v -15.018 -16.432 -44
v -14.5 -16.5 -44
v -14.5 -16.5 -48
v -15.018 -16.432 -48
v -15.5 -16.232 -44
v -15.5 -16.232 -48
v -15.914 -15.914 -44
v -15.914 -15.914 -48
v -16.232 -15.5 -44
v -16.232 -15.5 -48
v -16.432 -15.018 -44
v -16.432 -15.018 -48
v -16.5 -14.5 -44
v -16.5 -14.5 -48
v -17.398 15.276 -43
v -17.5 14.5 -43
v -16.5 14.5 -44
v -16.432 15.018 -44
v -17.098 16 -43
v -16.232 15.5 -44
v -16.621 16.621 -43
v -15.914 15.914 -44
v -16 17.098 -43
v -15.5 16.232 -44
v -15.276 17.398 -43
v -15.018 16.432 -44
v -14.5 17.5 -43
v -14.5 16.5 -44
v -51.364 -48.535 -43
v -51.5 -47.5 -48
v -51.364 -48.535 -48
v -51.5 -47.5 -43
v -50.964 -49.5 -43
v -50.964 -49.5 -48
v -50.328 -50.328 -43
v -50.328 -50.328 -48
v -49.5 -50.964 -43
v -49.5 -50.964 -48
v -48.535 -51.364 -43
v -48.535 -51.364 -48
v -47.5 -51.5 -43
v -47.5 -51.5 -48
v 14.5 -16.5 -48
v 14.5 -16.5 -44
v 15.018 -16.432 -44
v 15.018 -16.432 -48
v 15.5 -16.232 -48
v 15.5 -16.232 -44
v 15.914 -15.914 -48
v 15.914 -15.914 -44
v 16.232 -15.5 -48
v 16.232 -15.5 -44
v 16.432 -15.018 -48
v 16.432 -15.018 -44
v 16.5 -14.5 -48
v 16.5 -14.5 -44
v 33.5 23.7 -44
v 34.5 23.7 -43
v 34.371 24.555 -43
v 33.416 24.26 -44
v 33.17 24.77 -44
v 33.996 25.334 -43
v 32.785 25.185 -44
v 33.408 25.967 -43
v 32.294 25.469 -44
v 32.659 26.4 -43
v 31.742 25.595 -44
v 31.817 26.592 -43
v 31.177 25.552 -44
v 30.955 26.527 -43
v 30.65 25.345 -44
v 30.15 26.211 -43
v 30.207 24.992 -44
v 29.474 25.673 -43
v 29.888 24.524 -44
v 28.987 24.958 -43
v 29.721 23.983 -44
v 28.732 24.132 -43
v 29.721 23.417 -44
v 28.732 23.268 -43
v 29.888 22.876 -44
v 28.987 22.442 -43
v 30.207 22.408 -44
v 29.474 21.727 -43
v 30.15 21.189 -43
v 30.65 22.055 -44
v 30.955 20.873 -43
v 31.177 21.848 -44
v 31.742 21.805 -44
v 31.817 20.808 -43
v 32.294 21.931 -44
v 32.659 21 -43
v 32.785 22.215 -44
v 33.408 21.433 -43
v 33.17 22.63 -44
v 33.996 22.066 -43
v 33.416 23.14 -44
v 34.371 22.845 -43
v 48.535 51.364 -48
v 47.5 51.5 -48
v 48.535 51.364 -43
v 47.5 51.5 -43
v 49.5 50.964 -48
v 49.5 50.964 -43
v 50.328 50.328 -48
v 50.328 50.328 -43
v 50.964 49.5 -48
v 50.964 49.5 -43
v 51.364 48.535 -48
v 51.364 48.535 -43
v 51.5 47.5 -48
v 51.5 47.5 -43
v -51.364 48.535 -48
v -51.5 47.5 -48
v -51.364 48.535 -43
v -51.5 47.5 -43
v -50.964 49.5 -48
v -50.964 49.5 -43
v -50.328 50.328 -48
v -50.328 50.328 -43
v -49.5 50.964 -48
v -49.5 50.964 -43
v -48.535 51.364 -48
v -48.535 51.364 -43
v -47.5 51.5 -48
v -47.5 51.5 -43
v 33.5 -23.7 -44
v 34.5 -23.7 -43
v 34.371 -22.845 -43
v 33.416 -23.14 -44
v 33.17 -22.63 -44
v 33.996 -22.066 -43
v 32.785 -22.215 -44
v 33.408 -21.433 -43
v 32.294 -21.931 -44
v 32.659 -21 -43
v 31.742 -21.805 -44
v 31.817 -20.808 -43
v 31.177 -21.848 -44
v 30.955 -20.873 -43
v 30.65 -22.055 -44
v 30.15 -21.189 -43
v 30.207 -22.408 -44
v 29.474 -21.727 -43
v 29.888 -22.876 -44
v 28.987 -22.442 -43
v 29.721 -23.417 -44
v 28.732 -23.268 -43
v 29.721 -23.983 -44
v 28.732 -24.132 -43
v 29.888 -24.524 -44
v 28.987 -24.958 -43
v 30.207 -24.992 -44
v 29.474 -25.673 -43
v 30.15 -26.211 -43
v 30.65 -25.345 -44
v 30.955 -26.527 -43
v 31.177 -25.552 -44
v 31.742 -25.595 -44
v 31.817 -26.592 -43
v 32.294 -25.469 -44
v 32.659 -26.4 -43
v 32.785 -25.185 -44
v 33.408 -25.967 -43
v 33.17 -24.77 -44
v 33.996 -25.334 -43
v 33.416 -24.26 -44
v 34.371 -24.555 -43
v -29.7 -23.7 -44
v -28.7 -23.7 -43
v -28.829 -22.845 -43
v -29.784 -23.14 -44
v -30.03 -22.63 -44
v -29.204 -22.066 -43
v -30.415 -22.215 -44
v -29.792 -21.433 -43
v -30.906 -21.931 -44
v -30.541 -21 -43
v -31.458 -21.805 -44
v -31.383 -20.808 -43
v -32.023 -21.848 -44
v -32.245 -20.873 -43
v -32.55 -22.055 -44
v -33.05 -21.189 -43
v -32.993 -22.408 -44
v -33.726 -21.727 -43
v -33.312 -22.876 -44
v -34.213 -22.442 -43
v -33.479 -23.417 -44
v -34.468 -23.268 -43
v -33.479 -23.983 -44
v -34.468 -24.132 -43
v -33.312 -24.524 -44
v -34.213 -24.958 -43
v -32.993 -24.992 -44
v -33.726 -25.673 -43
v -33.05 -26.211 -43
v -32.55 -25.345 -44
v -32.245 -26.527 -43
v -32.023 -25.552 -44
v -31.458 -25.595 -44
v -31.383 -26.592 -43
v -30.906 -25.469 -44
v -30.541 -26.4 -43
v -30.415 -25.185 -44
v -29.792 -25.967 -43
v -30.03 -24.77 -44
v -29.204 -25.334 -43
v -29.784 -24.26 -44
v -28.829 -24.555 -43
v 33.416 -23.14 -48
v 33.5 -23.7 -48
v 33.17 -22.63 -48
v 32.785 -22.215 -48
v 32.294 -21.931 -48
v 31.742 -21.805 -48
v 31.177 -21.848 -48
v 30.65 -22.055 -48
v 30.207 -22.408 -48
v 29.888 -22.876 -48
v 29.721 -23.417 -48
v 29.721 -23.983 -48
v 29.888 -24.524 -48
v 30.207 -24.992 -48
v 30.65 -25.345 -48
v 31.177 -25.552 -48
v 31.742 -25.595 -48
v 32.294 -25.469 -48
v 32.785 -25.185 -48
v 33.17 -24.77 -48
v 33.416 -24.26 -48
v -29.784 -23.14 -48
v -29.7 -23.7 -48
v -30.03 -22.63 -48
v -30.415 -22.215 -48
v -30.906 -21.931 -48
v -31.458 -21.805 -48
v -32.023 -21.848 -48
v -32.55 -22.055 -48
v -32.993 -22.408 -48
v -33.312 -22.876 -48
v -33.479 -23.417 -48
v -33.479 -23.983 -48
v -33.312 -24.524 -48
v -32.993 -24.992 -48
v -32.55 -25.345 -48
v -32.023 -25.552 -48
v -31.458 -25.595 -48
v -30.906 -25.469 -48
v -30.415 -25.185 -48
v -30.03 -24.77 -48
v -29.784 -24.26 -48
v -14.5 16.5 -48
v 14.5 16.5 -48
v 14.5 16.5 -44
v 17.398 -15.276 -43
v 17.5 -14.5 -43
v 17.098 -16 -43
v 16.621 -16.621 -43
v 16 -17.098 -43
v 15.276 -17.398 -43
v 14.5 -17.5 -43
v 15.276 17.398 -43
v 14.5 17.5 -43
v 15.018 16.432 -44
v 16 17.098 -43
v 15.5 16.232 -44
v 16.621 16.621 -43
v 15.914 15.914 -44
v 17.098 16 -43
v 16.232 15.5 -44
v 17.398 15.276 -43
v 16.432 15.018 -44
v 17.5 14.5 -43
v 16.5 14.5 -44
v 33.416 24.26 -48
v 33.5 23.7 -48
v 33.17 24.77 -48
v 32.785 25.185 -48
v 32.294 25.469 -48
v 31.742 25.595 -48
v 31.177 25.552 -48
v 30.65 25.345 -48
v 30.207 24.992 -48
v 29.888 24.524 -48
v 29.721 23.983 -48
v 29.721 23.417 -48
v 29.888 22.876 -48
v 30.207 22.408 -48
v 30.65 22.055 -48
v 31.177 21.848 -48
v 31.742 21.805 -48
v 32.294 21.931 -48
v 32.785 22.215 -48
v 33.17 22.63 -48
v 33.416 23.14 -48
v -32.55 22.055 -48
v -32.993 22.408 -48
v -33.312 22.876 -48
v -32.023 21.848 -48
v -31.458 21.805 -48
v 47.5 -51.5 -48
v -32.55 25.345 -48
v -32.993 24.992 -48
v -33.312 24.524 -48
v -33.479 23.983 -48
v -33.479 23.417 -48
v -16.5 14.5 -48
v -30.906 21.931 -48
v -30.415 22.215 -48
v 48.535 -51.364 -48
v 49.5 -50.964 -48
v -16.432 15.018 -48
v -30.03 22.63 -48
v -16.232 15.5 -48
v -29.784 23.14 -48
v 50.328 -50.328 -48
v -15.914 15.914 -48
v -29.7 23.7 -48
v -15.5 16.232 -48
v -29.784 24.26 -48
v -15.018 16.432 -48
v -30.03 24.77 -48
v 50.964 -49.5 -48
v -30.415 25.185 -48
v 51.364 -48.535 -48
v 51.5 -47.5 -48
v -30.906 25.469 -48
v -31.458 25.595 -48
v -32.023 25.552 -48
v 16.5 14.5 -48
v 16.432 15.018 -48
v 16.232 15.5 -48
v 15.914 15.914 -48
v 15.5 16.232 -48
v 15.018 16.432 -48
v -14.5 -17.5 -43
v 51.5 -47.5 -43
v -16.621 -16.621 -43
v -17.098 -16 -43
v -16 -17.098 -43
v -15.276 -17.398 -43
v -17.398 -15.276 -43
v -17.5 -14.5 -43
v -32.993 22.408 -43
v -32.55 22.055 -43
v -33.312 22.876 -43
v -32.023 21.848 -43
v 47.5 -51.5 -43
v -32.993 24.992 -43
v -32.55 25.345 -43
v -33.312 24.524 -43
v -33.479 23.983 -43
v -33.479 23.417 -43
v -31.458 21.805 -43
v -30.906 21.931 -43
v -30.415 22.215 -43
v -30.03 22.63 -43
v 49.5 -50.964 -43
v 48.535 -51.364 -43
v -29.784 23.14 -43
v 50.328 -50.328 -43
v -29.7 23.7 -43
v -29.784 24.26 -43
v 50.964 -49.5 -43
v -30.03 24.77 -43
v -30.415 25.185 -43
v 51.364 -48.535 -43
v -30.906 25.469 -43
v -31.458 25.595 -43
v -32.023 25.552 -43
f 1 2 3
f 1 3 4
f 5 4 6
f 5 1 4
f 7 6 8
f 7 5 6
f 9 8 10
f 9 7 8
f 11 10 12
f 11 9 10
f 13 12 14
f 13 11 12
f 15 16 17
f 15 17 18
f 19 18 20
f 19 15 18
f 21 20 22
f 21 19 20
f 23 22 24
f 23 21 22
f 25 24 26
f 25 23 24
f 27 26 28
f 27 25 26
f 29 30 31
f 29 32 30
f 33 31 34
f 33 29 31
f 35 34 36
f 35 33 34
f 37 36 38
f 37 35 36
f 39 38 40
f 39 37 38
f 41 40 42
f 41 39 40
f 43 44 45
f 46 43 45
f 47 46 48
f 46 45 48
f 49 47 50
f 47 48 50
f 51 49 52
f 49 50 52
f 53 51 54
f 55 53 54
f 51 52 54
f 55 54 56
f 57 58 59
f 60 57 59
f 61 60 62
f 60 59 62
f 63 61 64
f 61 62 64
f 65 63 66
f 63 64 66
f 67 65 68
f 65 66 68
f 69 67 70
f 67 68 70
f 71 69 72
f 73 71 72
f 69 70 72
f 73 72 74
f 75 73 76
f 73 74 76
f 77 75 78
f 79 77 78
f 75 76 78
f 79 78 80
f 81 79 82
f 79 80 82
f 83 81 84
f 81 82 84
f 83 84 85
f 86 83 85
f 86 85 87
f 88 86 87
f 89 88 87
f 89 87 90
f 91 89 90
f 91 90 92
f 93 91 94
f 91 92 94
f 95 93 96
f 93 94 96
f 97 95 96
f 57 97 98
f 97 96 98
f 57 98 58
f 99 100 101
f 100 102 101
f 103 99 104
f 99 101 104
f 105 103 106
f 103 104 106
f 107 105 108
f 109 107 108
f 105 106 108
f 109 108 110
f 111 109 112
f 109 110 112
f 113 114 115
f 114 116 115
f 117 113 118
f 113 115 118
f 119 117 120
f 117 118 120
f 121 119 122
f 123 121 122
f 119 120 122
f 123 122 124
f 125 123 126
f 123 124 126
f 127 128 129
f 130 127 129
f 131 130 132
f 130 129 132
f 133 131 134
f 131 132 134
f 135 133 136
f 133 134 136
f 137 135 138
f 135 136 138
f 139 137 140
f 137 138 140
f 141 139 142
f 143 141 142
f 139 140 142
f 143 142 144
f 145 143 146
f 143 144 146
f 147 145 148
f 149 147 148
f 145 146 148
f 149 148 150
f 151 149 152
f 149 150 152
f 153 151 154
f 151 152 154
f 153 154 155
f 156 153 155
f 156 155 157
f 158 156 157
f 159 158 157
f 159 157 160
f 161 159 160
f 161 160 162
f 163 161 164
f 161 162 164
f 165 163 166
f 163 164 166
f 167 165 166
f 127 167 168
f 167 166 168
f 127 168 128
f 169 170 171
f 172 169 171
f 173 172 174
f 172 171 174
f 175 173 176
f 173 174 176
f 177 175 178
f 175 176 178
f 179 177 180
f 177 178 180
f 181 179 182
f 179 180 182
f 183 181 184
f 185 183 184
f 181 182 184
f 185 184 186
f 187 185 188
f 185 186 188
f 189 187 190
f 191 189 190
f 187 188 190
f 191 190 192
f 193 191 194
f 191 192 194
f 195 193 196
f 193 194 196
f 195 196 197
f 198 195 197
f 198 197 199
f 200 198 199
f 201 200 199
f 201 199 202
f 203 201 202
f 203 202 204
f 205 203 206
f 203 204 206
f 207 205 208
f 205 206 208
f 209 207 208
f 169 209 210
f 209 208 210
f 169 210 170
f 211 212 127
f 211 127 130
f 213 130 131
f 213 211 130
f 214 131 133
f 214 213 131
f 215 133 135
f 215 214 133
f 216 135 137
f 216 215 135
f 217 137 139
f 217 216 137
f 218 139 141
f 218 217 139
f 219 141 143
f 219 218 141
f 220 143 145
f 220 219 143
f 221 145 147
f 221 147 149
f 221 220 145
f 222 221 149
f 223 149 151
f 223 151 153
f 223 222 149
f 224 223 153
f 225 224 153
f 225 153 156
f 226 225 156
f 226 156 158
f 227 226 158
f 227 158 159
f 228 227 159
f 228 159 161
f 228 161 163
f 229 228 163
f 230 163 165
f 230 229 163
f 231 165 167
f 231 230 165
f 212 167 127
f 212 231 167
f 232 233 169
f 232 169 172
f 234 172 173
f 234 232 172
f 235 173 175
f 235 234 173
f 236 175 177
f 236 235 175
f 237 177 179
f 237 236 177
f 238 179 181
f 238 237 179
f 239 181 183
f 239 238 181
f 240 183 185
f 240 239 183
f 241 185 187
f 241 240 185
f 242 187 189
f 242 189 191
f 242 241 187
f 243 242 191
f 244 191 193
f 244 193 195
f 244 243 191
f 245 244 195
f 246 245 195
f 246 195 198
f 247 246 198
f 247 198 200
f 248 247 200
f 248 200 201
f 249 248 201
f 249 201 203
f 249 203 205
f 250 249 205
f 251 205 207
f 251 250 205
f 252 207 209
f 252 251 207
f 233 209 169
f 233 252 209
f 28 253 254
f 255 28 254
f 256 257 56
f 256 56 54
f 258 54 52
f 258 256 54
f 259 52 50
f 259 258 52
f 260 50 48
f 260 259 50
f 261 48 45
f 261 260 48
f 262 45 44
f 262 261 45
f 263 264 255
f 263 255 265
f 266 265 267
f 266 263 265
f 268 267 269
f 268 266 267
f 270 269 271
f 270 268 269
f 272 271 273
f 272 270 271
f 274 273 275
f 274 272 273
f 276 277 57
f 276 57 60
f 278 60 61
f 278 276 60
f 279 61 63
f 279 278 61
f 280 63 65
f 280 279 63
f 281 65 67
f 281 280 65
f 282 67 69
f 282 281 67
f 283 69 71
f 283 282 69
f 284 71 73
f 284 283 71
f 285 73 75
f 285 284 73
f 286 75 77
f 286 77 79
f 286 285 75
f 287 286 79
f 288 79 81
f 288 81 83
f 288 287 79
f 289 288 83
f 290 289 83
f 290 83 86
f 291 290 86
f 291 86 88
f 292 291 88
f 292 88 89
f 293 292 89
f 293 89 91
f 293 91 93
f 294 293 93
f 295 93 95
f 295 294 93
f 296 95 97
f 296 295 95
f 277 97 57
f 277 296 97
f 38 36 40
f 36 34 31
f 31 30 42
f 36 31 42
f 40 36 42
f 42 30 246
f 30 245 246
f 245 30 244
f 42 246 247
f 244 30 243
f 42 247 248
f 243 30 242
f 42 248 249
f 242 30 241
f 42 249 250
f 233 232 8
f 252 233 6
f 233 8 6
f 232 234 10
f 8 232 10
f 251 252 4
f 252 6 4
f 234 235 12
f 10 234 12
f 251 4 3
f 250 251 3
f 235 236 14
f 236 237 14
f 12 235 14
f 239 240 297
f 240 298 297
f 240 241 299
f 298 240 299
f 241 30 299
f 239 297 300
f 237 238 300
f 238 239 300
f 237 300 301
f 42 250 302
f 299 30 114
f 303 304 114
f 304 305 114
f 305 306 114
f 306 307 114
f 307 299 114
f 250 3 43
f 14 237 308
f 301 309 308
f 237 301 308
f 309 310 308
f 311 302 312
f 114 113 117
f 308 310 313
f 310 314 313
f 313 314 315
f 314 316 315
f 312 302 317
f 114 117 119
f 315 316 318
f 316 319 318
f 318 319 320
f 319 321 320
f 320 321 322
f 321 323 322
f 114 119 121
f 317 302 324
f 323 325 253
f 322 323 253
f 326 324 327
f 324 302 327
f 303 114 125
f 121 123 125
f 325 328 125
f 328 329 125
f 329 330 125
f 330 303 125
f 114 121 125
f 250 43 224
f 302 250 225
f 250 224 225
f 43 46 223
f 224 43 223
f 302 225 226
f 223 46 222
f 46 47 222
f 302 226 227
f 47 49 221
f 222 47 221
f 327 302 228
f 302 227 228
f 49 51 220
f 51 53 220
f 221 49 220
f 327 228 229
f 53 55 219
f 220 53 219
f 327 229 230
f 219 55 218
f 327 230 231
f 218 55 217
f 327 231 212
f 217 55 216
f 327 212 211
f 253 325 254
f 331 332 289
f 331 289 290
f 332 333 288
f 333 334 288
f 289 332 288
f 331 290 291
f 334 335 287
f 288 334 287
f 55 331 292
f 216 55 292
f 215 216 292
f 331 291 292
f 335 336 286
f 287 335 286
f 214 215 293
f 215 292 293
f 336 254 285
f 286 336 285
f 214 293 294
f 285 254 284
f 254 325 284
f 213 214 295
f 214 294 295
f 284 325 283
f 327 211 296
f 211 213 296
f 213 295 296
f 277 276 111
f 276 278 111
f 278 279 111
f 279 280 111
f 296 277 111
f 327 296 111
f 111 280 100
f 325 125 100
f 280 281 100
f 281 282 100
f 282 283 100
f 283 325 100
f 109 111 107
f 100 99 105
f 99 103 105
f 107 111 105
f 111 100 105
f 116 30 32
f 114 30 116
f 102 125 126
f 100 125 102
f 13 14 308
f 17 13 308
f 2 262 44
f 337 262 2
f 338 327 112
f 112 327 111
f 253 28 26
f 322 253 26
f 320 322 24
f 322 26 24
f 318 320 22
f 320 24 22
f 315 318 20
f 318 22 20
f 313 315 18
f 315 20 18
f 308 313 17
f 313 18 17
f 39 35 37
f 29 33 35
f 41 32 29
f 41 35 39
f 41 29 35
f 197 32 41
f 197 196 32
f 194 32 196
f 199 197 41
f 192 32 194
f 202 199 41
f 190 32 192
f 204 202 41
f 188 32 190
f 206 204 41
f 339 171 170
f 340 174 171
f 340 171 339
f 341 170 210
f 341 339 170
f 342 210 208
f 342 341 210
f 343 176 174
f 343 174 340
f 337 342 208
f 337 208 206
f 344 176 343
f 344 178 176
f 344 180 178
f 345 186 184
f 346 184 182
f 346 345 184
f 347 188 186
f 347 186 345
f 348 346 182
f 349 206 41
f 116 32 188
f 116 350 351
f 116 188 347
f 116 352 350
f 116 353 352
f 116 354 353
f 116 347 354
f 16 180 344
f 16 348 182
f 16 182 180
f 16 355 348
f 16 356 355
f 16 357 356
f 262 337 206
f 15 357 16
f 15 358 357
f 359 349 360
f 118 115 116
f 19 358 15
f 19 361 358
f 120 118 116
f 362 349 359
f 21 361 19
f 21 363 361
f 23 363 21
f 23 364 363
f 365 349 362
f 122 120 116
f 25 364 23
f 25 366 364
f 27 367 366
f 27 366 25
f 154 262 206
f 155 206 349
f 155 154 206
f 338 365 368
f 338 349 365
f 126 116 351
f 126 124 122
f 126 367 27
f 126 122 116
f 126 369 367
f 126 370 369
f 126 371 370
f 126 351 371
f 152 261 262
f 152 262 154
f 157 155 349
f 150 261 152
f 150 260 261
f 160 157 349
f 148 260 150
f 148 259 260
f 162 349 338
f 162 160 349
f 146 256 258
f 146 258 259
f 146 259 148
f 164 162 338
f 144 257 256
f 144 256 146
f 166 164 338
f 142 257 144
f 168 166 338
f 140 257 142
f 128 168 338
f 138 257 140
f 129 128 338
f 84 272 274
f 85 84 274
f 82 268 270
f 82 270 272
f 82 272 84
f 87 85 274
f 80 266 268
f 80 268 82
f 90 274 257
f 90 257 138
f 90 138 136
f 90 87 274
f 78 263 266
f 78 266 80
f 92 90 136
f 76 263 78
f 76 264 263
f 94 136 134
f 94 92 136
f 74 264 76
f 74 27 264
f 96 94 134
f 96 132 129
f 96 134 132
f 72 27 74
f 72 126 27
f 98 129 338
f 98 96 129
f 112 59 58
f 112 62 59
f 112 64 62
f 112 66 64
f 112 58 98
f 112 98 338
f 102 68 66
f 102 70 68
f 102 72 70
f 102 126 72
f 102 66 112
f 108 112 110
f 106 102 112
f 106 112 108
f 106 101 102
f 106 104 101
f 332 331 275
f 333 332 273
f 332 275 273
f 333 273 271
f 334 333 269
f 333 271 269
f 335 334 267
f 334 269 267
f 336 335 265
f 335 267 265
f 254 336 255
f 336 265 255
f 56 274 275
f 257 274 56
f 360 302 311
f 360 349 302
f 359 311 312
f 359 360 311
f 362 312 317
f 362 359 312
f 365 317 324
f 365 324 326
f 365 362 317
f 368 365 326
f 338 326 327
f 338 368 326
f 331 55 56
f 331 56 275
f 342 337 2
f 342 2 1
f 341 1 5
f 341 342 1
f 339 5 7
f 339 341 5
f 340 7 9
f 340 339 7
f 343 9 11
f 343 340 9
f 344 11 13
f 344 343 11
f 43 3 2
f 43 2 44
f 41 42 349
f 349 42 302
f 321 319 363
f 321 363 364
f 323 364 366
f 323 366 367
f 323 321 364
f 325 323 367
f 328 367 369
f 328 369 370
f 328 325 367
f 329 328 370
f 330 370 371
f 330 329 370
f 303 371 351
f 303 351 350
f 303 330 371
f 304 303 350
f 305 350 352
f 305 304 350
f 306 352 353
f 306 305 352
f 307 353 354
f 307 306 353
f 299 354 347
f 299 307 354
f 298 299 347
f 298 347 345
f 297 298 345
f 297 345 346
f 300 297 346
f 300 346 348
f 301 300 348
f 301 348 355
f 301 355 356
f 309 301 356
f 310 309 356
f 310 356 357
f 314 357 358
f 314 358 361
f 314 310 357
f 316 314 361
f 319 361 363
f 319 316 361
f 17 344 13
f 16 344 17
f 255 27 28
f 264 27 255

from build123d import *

# Parameters (mm, degrees)
CYLINDER006_R     = 1.9
CYLINDER006_DEPTH = 5
CYLINDER007_R     = 1.9
CYLINDER007_DEPTH = 5
CYLINDER008_R     = 1.9
CYLINDER008_DEPTH = 5
CYLINDER005_R     = 1.9
CYLINDER005_DEPTH = 5
BOX009_W          = 33
BOX009_H          = 33
BOX009_DEPTH      = 5
BOX010_W          = 72
BOX010_H          = 72
BOX010_DEPTH      = 5
FILLET002_R       = 2
FILLET003_R       = 4
CHAMFER001_SIZE   = 1
BOX013_W          = 69.4
BOX013_H          = 69.4
BOX013_DEPTH      = 5
BOX012_W          = 103
BOX012_H          = 103
BOX012_DEPTH      = 5
FILLET005_R       = 4
FILLET006_R       = 2


with BuildPart() as cilindro003:
    # Cylinder006 → Cylinder006 (new body)
    with BuildSketch(Plane(origin=(31.6, 23.7, -48), x_dir=(1, 0, 0), z_dir=(0, 0, 1))):
        Circle(CYLINDER006_R)
    extrude(amount=CYLINDER006_DEPTH)


with BuildPart() as cilindro004:
    # Cylinder007 → Cylinder007 (new body)
    with BuildSketch(Plane(origin=(-31.6, 23.7, -48), x_dir=(1, 0, 0), z_dir=(0, 0, 1))):
        Circle(CYLINDER007_R)
    extrude(amount=CYLINDER007_DEPTH)


with BuildPart() as cilindro005:
    # Cylinder008 → Cylinder008 (new body)
    with BuildSketch(Plane(origin=(-31.6, -23.7, -48), x_dir=(1, 0, 0), z_dir=(0, 0, 1))):
        Circle(CYLINDER008_R)
    extrude(amount=CYLINDER008_DEPTH)


with BuildPart() as compound003:
    # Cylinder005 → Cylinder005 (new body)
    with BuildSketch(Plane(origin=(31.6, -23.7, -48), x_dir=(1, 0, 0), z_dir=(0, 0, 1))):
        Circle(CYLINDER005_R)
    extrude(amount=CYLINDER005_DEPTH)

    # Compound003: union Cilindro003, Cilindro004, Cilindro005
    add(cilindro003.part)
    add(cilindro004.part)
    add(cilindro005.part)


with BuildPart() as cubo008:
    # Box009 → Box009 (new body)
    with BuildSketch(Plane(origin=(-16.5, -16.5, -48), x_dir=(1, 0, 0), z_dir=(0, 0, 1))):
        with Locations((16.5, 16.5)):
            Rectangle(BOX009_W, BOX009_H)
    extrude(amount=BOX009_DEPTH)


with BuildPart() as chamfer001:
    # Box010 → Box010 (new body)
    with BuildSketch(Plane(origin=(-36, -36, -48), x_dir=(1, 0, 0), z_dir=(0, 0, 1))):
        with Locations((36, 36)):
            Rectangle(BOX010_W, BOX010_H)
    extrude(amount=BOX010_DEPTH)

    # Cut003: cut Cubo008
    add(cubo008.part, mode=Mode.SUBTRACT)

    # Fillet002
    fillet002_edges = [chamfer001.edges().sort_by_distance(p)[0] for p in [
        (-16.5, -16.5, -45.5),
        (-16.5, 16.5, -45.5),
        (16.5, -16.5, -45.5),
        (16.5, 16.5, -45.5),
    ]]
    fillet(fillet002_edges, radius=FILLET002_R)

    # Fillet003
    fillet003_edges = [chamfer001.edges().sort_by_distance(p)[0] for p in [
        (-36, -36, -45.5),
        (-36, 36, -45.5),
        (36, 36, -45.5),
        (36, -36, -45.5),
    ]]
    fillet(fillet003_edges, radius=FILLET003_R)

    # Cut006: cut Compound003
    add(compound003.part, mode=Mode.SUBTRACT)

    # Chamfer001
    chamfer001_edges = [chamfer001.edges().sort_by_distance(p)[0] for p in [
        (-33.5, -23.7, -43),
        (29.7, -23.7, -43),
        (-16.5, 0, -43),
        (29.7, 23.7, -43),
    ]]
    chamfer(chamfer001_edges, length=CHAMFER001_SIZE)


with BuildPart() as cubo012:
    # Box013 → Box013 (new body)
    with BuildSketch(Plane(origin=(-34.7, -34.7, -48), x_dir=(1, 0, 0), z_dir=(0, 0, 1))):
        with Locations((34.7, 34.7)):
            Rectangle(BOX013_W, BOX013_H)
    extrude(amount=BOX013_DEPTH)


with BuildPart() as fusion002:
    # Box012 → Box012 (new body)
    with BuildSketch(Plane(origin=(-51.5, -51.5, -48), x_dir=(1, 0, 0), z_dir=(0, 0, 1))):
        with Locations((51.5, 51.5)):
            Rectangle(BOX012_W, BOX012_H)
    extrude(amount=BOX012_DEPTH)

    # Cut005: cut Cubo012
    add(cubo012.part, mode=Mode.SUBTRACT)

    # Fillet005
    fillet005_edges = [fusion002.edges().sort_by_distance(p)[0] for p in [
        (-51.5, -51.5, -45.5),
        (-51.5, 51.5, -45.5),
        (51.5, -51.5, -45.5),
        (51.5, 51.5, -45.5),
    ]]
    fillet(fillet005_edges, radius=FILLET005_R)

    # Fillet006
    fillet006_edges = [fusion002.edges().sort_by_distance(p)[0] for p in [
        (-34.7, -34.7, -45.5),
        (-34.7, 34.7, -45.5),
        (34.7, -34.7, -45.5),
        (34.7, 34.7, -45.5),
    ]]
    fillet(fillet006_edges, radius=FILLET006_R)

    # Fusion002: union Chamfer001
    add(chamfer001.part)


solid = fusion002.part
